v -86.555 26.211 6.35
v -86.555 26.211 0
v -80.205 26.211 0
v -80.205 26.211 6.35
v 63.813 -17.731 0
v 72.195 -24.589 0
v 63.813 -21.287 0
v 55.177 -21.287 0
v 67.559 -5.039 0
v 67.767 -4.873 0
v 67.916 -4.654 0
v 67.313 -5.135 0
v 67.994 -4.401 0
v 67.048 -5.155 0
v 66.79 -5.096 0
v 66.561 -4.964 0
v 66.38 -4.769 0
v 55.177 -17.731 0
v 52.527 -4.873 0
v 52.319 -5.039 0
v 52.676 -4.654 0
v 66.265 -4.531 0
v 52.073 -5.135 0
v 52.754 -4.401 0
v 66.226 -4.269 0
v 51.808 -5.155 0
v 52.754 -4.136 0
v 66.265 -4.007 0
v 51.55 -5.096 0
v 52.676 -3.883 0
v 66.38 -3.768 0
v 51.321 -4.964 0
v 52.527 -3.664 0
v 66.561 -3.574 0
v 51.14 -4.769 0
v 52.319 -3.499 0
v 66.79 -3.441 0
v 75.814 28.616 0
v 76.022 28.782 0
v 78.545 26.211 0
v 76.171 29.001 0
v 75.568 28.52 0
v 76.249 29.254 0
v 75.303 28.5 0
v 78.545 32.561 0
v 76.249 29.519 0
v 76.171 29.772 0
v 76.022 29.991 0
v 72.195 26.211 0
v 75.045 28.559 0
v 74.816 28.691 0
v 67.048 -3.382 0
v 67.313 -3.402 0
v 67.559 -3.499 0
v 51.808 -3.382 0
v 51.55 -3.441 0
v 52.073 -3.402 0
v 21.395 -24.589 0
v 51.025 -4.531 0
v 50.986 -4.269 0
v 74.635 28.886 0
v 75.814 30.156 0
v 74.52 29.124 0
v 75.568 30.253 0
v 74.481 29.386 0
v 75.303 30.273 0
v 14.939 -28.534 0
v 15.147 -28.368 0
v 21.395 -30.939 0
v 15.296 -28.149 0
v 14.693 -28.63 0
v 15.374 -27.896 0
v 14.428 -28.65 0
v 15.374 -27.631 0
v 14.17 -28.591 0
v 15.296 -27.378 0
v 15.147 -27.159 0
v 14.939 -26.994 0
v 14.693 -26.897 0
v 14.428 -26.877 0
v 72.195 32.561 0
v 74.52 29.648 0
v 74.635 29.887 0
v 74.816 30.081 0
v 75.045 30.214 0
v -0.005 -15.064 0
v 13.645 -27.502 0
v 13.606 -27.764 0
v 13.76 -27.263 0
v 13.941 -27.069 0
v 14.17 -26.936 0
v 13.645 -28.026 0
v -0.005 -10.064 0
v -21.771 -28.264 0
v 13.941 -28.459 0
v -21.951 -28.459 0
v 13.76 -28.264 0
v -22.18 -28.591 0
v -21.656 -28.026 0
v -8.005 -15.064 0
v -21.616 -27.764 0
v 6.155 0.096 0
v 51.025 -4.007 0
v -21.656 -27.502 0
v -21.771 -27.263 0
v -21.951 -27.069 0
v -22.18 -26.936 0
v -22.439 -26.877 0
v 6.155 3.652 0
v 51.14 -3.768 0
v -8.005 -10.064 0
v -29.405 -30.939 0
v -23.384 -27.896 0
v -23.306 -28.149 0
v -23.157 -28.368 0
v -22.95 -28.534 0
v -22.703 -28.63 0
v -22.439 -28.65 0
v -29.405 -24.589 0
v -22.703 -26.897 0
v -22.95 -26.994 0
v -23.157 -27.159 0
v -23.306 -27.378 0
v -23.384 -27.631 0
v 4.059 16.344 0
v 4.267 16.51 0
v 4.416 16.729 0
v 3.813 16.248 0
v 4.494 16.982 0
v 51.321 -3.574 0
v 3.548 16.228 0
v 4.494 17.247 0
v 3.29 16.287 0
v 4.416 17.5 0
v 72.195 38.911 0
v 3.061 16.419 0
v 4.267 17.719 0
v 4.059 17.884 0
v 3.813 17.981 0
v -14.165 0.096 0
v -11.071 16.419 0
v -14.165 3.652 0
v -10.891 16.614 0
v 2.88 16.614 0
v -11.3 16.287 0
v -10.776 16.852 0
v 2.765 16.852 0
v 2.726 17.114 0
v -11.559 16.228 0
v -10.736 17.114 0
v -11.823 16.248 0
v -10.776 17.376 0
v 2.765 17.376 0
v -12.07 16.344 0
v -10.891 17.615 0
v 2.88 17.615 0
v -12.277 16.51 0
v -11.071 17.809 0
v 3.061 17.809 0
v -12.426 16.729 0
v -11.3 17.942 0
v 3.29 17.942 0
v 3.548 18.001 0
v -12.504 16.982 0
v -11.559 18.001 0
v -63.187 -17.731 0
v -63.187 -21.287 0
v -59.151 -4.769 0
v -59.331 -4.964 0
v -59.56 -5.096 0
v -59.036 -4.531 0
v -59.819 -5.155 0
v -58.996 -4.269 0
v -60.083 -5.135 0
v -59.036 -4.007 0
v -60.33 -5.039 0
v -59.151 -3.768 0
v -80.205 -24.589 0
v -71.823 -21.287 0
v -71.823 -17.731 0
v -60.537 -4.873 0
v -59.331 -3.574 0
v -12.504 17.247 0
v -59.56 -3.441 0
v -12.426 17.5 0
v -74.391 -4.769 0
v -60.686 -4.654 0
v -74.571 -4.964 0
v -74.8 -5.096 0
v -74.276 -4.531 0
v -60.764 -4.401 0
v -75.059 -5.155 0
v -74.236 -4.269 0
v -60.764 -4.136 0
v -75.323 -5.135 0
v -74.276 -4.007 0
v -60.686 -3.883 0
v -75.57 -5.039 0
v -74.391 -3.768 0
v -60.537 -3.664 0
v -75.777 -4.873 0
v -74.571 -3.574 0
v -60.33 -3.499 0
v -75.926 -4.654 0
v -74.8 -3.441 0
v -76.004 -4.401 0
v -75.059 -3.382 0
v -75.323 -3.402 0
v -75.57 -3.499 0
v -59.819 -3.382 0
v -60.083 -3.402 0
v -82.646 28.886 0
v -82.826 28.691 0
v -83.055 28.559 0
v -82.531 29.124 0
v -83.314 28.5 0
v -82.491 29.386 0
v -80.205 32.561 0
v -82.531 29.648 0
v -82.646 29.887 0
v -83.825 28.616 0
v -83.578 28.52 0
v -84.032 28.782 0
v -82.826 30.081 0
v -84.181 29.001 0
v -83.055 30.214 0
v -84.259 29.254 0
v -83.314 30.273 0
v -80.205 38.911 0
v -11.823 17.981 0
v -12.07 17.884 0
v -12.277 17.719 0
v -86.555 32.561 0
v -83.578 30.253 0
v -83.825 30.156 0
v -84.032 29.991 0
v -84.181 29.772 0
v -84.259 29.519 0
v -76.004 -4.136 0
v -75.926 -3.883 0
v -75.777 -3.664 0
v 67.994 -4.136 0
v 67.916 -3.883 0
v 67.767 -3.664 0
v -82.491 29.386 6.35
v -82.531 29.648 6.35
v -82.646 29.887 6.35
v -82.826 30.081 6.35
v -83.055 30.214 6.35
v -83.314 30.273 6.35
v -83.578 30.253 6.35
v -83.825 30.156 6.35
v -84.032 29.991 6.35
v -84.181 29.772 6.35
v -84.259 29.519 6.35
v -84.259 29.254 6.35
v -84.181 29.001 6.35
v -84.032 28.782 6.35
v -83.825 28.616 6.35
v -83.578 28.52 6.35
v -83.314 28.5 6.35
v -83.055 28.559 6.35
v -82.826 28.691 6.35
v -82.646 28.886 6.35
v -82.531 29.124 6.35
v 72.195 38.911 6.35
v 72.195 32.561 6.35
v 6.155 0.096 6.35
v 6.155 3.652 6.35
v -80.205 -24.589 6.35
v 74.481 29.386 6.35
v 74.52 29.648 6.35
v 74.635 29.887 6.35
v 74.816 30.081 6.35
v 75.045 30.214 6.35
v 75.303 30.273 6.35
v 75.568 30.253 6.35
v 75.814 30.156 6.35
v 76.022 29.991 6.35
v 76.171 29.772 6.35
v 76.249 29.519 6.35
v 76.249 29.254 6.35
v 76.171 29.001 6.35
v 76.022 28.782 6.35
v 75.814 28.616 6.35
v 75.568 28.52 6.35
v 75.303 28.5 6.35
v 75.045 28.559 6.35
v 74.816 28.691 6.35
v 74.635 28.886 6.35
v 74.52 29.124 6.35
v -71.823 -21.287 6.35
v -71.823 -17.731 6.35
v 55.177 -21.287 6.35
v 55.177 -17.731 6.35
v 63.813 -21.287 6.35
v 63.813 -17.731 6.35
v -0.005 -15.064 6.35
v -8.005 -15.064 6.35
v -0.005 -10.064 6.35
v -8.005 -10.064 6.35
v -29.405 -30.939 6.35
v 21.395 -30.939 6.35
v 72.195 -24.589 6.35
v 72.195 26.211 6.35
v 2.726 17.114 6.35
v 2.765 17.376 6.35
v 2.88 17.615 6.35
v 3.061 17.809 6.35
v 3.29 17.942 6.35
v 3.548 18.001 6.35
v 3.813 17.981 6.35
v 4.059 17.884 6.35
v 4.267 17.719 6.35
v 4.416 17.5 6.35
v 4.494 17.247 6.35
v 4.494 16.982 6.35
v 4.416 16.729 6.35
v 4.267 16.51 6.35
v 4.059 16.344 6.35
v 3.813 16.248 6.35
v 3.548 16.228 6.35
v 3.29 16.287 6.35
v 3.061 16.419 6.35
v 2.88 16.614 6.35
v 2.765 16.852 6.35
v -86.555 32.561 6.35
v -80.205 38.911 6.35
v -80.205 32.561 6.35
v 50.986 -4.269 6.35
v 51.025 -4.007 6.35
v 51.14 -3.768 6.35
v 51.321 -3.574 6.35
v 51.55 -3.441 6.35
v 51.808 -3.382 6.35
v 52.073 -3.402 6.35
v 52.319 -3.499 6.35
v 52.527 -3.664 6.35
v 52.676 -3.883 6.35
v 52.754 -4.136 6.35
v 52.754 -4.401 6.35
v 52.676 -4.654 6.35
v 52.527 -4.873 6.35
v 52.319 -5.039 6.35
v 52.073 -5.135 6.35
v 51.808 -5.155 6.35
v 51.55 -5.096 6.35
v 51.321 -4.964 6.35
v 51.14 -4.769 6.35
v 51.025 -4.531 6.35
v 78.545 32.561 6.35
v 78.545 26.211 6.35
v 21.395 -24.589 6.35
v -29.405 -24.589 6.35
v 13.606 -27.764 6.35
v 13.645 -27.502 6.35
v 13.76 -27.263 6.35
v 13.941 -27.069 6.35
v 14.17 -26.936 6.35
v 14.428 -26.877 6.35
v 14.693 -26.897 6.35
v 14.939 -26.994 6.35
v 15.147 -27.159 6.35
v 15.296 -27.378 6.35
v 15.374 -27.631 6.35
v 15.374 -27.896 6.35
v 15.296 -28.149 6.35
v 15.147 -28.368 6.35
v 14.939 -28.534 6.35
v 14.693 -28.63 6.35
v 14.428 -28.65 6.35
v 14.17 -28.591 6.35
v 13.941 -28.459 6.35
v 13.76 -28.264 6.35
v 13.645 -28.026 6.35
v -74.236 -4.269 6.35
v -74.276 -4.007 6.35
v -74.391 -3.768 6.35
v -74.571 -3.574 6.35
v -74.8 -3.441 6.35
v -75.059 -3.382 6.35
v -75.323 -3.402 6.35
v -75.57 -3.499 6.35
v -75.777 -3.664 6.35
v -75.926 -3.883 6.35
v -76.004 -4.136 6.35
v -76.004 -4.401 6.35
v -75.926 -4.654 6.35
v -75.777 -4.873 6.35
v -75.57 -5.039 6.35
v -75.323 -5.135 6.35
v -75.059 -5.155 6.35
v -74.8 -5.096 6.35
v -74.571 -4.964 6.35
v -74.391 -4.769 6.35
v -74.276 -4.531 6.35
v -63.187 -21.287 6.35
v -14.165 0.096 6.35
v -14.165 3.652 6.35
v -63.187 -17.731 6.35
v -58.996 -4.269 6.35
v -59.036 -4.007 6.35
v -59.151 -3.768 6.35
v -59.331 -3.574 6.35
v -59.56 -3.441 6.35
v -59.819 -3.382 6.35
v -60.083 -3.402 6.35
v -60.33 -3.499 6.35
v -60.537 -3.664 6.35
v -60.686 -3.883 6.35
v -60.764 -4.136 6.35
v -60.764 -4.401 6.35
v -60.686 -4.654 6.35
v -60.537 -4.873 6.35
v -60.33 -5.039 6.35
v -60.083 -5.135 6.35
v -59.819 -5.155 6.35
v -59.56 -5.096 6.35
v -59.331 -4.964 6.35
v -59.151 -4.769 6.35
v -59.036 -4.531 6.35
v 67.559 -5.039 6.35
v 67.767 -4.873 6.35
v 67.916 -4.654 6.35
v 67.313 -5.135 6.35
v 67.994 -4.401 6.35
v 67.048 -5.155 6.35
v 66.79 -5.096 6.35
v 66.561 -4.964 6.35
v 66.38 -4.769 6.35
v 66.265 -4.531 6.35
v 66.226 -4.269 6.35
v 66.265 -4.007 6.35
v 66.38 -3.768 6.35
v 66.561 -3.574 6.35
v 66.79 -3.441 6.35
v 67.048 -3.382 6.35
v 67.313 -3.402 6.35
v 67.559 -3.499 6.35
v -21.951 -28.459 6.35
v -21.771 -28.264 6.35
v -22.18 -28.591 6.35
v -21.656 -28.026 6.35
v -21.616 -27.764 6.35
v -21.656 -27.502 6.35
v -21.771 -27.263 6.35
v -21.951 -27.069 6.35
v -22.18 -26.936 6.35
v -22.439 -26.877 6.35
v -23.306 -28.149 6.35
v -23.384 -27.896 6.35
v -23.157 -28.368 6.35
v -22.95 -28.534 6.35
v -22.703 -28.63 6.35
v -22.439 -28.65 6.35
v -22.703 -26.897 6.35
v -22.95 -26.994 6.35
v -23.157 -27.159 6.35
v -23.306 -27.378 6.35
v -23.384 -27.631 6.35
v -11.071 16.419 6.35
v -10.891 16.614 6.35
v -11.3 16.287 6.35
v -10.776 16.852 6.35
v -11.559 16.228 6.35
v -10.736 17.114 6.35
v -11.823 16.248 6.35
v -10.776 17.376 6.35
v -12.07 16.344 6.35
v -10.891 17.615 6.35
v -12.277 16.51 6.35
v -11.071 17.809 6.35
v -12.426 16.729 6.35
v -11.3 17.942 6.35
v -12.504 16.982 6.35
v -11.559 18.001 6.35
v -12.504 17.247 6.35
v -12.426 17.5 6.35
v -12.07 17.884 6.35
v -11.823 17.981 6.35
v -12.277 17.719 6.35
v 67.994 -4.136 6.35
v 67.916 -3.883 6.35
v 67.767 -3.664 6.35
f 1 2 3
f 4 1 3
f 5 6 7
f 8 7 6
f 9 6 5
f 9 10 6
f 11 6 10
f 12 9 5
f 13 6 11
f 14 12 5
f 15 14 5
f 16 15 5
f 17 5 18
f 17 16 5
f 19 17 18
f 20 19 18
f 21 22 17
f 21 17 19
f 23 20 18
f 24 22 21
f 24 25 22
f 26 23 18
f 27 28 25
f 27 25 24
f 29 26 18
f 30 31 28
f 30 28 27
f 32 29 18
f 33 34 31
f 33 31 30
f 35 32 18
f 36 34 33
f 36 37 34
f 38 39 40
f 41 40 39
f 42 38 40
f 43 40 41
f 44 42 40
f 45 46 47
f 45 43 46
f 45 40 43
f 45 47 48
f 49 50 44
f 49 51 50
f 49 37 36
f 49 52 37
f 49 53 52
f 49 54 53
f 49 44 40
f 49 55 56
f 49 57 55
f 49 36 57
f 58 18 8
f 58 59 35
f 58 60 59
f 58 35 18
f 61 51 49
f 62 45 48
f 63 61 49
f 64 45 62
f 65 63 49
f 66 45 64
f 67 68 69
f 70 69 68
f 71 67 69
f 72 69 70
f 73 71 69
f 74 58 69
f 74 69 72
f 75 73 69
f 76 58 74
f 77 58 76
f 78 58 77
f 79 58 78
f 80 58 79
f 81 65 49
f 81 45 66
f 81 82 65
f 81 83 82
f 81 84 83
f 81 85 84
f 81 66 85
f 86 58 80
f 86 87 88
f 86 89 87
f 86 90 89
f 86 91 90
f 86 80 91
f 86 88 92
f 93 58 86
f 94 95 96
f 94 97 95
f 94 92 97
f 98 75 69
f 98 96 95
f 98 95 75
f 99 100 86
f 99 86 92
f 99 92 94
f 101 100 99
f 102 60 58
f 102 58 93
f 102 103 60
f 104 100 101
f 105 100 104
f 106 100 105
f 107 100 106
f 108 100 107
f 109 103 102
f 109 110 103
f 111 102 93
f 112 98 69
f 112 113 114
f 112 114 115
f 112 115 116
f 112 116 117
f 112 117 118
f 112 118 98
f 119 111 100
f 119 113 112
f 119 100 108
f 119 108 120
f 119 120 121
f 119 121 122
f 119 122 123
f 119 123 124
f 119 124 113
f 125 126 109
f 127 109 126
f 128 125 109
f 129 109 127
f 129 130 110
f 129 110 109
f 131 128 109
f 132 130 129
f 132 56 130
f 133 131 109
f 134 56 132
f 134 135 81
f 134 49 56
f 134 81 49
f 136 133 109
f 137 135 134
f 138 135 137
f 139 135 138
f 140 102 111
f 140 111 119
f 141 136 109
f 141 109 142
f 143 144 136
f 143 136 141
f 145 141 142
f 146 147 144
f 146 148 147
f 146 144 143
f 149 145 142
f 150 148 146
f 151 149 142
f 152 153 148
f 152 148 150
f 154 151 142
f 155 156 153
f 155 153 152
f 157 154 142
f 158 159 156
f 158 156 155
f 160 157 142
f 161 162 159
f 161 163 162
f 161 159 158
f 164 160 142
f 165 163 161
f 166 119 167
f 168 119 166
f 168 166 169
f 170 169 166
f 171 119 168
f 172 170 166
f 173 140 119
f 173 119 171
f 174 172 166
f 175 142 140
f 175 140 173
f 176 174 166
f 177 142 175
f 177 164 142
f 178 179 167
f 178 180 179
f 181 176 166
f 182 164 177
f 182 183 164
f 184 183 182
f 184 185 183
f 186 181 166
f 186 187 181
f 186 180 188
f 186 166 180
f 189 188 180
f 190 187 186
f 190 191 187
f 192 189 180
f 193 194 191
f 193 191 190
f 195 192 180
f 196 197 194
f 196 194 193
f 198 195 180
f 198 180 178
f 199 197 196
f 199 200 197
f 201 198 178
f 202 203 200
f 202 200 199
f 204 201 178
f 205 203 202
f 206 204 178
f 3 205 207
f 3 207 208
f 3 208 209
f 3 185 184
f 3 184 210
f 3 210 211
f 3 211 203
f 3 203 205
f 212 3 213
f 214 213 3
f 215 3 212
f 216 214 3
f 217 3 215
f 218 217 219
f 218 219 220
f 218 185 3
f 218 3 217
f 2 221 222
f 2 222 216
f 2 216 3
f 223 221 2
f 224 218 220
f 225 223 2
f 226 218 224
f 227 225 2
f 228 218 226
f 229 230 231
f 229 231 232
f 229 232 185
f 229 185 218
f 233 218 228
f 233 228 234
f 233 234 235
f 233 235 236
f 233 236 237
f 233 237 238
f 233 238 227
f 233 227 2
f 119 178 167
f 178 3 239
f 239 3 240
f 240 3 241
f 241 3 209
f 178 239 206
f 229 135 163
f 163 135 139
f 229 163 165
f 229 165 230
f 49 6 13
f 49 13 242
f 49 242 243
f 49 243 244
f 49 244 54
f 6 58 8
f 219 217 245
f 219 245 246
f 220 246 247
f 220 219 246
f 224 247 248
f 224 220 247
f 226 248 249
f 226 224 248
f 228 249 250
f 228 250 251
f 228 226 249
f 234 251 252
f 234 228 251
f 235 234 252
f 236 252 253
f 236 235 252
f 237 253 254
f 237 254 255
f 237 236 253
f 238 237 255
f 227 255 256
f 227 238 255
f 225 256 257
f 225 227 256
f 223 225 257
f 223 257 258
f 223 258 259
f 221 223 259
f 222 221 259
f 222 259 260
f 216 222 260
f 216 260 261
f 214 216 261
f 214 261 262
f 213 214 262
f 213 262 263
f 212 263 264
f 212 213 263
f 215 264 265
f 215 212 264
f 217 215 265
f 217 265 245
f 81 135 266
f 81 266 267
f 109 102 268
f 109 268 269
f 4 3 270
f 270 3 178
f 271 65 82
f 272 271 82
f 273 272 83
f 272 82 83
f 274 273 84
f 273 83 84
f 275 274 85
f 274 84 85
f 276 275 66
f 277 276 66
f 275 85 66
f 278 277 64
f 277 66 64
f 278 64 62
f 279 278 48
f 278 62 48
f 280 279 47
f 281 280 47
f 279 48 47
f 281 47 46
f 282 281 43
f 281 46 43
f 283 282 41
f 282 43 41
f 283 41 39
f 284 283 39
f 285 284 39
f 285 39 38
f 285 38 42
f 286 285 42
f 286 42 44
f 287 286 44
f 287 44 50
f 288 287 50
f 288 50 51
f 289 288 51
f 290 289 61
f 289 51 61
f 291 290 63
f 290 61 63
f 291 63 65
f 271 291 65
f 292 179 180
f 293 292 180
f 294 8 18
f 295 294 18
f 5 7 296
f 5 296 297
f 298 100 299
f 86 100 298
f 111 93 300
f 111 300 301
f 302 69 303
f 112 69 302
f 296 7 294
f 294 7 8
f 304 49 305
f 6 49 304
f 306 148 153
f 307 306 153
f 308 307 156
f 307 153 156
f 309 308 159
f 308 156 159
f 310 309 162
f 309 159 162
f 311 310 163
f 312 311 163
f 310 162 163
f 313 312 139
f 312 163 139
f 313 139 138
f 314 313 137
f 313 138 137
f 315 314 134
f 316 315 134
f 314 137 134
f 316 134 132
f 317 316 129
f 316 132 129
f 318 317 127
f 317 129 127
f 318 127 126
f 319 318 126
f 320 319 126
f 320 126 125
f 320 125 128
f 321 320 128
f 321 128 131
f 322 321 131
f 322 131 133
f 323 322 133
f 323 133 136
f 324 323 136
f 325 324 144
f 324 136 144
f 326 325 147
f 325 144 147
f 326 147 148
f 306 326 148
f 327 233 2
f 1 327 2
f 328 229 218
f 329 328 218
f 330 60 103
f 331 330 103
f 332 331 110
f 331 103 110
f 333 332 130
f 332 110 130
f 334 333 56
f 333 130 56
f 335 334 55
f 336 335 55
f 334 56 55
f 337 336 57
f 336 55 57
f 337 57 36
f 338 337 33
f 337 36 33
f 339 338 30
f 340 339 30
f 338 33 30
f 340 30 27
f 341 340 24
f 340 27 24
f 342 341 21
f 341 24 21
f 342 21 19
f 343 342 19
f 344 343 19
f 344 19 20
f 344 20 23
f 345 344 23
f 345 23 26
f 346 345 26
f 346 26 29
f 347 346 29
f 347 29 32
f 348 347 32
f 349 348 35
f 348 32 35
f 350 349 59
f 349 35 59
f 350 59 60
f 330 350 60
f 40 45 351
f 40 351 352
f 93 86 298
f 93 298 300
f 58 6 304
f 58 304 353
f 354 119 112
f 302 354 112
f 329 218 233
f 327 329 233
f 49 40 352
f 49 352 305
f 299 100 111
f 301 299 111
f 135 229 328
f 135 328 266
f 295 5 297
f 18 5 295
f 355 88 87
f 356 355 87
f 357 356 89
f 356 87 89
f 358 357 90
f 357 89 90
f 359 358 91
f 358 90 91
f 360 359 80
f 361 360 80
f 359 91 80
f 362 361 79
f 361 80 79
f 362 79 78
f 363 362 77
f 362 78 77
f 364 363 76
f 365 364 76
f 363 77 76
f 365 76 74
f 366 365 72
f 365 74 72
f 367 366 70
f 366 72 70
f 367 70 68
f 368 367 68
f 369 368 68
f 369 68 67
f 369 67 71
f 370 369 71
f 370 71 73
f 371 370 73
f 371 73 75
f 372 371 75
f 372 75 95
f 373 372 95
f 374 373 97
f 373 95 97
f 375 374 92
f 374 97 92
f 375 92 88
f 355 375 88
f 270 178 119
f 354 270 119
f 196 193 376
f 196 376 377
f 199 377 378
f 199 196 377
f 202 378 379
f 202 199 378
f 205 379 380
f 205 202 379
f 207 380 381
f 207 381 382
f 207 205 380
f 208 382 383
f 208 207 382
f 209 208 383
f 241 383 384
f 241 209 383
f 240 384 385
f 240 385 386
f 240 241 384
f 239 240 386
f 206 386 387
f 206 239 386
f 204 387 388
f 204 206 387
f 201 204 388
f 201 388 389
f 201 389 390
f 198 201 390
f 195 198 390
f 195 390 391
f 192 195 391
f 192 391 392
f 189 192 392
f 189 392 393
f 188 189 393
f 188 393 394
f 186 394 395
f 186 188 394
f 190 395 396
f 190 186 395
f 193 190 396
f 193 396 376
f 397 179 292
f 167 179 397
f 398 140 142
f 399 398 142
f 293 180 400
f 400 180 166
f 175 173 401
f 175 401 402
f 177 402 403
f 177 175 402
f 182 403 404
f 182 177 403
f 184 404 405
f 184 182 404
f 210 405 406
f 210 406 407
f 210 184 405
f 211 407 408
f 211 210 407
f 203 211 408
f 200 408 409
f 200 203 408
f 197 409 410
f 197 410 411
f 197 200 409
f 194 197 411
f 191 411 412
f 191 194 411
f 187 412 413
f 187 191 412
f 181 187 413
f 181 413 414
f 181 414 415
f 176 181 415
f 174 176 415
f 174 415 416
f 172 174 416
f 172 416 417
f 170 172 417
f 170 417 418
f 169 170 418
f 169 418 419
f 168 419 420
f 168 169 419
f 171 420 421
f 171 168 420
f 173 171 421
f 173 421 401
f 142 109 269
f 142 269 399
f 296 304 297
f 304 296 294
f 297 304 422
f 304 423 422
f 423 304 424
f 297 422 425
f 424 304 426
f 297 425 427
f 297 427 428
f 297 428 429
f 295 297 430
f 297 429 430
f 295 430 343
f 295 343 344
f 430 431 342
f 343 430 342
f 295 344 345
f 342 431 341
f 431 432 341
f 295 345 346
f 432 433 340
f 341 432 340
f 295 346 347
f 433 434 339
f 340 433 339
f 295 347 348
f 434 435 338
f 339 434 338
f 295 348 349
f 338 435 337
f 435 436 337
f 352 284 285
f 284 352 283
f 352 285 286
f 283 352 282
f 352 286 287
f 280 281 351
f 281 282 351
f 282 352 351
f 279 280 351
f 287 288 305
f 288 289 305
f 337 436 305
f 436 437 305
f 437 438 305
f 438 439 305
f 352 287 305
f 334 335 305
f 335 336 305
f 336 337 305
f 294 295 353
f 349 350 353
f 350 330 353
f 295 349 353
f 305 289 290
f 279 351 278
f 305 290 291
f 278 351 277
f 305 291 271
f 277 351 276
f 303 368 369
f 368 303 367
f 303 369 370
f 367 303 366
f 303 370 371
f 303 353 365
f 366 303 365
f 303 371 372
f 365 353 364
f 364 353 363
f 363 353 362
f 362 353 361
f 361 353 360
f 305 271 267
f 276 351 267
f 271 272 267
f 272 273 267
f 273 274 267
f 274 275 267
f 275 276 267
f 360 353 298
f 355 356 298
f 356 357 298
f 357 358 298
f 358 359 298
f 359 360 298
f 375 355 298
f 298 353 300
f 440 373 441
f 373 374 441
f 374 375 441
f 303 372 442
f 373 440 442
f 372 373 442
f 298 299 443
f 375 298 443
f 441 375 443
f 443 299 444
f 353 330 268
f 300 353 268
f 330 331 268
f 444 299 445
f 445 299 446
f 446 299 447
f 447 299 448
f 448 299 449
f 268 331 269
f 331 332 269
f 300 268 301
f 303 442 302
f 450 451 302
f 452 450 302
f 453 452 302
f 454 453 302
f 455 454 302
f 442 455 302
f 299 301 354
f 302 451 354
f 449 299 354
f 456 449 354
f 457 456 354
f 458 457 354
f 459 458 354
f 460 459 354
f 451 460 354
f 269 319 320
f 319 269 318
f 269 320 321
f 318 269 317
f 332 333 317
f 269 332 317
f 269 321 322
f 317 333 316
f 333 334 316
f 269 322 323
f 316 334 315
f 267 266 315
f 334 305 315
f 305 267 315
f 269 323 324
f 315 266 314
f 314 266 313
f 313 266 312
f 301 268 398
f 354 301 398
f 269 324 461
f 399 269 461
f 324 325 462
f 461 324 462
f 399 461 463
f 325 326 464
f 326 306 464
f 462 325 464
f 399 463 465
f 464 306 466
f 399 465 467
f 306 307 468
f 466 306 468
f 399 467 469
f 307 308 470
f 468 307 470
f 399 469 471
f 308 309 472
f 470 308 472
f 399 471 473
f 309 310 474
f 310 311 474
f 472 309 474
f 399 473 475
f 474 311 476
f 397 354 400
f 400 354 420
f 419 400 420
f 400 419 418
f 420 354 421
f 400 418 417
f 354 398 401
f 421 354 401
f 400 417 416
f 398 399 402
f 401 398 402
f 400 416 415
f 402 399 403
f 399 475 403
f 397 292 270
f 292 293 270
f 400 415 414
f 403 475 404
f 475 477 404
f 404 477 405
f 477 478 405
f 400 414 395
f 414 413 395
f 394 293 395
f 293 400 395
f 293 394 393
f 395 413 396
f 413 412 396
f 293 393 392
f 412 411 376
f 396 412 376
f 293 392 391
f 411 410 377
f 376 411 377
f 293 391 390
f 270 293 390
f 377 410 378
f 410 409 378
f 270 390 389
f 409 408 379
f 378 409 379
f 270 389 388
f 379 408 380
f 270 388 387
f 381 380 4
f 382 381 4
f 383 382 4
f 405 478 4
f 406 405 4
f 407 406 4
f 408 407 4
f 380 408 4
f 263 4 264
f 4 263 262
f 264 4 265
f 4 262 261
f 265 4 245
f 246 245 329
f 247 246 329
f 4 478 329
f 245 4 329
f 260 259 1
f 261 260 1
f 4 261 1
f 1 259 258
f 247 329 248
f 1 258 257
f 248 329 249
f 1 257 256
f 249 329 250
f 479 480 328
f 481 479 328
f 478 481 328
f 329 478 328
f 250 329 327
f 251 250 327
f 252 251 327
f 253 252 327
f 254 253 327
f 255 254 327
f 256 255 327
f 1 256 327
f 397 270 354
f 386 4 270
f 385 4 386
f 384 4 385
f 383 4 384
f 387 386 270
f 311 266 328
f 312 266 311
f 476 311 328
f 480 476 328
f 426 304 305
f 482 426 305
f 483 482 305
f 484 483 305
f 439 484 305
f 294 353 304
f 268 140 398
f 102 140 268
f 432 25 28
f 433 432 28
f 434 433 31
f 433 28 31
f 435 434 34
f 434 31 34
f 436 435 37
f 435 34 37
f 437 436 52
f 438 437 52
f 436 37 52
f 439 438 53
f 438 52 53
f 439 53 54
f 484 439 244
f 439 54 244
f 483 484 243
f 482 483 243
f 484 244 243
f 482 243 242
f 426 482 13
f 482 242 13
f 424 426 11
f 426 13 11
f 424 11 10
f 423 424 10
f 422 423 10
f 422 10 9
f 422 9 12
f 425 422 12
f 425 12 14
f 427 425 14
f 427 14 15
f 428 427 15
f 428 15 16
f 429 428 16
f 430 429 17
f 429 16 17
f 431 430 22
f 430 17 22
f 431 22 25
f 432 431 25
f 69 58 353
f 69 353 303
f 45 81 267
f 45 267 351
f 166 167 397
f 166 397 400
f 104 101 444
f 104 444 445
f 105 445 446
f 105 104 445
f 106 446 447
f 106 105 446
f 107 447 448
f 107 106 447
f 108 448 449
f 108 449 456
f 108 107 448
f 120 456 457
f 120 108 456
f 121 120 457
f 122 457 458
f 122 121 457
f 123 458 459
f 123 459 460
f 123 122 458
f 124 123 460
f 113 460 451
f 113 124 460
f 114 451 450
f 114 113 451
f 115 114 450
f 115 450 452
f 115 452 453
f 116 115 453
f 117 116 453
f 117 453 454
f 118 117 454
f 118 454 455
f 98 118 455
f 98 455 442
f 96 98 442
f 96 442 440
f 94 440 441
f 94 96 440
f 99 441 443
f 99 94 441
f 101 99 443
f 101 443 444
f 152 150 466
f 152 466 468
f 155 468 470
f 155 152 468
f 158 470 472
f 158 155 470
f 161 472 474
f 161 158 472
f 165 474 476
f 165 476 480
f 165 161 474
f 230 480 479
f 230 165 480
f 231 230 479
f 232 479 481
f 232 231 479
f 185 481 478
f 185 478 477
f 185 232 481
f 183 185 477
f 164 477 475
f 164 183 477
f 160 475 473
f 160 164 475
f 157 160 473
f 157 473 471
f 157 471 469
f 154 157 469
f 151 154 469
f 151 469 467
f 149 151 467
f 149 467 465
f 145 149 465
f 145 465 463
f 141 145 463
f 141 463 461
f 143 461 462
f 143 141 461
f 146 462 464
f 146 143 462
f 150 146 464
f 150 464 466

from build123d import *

# Parameters (mm, degrees)
SKETCH1_R           = 0.889
SKETCH1_W           = 8.636
SKETCH1_H           = 3.556
BOSS_EXTRUDE1_DEPTH = 6.35


with BuildPart() as part:
    # Sketch1 → Boss-Extrude1 (new body)
    with BuildSketch(Plane.XY):
        Polygon((-4.005119969, -10.063655938), (-4.005119969, 0.096344062), (-14.165119969, 0.096344062), (-14.165119969, 3.652344062), (-4.005119969, 3.652344062), (-4.005119969, 38.911344062), (-80.205119969, 38.911344062), (-80.205119969, 32.561344062), (-86.555119969, 32.561344062), (-86.555119969, 26.211344062), (-80.205119969, 26.211344062), (-80.205119969, -24.588655938), (-29.405119969, -24.588655938), (-29.405119969, -30.938655938), (-4.005119969, -30.938655938), (-4.005119969, -15.063655938), (-8.005119969, -15.063655938), (-8.005119969, -10.063655938), align=None)
        with Locations((-83.380119969, 29.386344062)):
            Circle(SKETCH1_R, mode=Mode.SUBTRACT)
        with Locations((-75.125119969, -4.268655938)):
            Circle(SKETCH1_R, mode=Mode.SUBTRACT)
        with Locations((-22.505119969, -27.763655938)):
            Circle(SKETCH1_R, mode=Mode.SUBTRACT)
        with Locations((-59.885119969, -4.268655938)):
            Circle(SKETCH1_R, mode=Mode.SUBTRACT)
        with Locations((-11.625119969, 17.114344062)):
            Circle(SKETCH1_R, mode=Mode.SUBTRACT)
        with Locations((-67.505119969, -19.508655938)):
            Rectangle(SKETCH1_W, SKETCH1_H, mode=Mode.SUBTRACT)
    boss_extrude1 = extrude(amount=BOSS_EXTRUDE1_DEPTH)

    # Mirror1: Boss-Extrude1 across plane
    add(boss_extrude1.mirror(Plane(origin=(-4.005119969, -10.063655938, 6.35), x_dir=(0, 0, 1), z_dir=(-1, 0, 0))))


solid = part.part
